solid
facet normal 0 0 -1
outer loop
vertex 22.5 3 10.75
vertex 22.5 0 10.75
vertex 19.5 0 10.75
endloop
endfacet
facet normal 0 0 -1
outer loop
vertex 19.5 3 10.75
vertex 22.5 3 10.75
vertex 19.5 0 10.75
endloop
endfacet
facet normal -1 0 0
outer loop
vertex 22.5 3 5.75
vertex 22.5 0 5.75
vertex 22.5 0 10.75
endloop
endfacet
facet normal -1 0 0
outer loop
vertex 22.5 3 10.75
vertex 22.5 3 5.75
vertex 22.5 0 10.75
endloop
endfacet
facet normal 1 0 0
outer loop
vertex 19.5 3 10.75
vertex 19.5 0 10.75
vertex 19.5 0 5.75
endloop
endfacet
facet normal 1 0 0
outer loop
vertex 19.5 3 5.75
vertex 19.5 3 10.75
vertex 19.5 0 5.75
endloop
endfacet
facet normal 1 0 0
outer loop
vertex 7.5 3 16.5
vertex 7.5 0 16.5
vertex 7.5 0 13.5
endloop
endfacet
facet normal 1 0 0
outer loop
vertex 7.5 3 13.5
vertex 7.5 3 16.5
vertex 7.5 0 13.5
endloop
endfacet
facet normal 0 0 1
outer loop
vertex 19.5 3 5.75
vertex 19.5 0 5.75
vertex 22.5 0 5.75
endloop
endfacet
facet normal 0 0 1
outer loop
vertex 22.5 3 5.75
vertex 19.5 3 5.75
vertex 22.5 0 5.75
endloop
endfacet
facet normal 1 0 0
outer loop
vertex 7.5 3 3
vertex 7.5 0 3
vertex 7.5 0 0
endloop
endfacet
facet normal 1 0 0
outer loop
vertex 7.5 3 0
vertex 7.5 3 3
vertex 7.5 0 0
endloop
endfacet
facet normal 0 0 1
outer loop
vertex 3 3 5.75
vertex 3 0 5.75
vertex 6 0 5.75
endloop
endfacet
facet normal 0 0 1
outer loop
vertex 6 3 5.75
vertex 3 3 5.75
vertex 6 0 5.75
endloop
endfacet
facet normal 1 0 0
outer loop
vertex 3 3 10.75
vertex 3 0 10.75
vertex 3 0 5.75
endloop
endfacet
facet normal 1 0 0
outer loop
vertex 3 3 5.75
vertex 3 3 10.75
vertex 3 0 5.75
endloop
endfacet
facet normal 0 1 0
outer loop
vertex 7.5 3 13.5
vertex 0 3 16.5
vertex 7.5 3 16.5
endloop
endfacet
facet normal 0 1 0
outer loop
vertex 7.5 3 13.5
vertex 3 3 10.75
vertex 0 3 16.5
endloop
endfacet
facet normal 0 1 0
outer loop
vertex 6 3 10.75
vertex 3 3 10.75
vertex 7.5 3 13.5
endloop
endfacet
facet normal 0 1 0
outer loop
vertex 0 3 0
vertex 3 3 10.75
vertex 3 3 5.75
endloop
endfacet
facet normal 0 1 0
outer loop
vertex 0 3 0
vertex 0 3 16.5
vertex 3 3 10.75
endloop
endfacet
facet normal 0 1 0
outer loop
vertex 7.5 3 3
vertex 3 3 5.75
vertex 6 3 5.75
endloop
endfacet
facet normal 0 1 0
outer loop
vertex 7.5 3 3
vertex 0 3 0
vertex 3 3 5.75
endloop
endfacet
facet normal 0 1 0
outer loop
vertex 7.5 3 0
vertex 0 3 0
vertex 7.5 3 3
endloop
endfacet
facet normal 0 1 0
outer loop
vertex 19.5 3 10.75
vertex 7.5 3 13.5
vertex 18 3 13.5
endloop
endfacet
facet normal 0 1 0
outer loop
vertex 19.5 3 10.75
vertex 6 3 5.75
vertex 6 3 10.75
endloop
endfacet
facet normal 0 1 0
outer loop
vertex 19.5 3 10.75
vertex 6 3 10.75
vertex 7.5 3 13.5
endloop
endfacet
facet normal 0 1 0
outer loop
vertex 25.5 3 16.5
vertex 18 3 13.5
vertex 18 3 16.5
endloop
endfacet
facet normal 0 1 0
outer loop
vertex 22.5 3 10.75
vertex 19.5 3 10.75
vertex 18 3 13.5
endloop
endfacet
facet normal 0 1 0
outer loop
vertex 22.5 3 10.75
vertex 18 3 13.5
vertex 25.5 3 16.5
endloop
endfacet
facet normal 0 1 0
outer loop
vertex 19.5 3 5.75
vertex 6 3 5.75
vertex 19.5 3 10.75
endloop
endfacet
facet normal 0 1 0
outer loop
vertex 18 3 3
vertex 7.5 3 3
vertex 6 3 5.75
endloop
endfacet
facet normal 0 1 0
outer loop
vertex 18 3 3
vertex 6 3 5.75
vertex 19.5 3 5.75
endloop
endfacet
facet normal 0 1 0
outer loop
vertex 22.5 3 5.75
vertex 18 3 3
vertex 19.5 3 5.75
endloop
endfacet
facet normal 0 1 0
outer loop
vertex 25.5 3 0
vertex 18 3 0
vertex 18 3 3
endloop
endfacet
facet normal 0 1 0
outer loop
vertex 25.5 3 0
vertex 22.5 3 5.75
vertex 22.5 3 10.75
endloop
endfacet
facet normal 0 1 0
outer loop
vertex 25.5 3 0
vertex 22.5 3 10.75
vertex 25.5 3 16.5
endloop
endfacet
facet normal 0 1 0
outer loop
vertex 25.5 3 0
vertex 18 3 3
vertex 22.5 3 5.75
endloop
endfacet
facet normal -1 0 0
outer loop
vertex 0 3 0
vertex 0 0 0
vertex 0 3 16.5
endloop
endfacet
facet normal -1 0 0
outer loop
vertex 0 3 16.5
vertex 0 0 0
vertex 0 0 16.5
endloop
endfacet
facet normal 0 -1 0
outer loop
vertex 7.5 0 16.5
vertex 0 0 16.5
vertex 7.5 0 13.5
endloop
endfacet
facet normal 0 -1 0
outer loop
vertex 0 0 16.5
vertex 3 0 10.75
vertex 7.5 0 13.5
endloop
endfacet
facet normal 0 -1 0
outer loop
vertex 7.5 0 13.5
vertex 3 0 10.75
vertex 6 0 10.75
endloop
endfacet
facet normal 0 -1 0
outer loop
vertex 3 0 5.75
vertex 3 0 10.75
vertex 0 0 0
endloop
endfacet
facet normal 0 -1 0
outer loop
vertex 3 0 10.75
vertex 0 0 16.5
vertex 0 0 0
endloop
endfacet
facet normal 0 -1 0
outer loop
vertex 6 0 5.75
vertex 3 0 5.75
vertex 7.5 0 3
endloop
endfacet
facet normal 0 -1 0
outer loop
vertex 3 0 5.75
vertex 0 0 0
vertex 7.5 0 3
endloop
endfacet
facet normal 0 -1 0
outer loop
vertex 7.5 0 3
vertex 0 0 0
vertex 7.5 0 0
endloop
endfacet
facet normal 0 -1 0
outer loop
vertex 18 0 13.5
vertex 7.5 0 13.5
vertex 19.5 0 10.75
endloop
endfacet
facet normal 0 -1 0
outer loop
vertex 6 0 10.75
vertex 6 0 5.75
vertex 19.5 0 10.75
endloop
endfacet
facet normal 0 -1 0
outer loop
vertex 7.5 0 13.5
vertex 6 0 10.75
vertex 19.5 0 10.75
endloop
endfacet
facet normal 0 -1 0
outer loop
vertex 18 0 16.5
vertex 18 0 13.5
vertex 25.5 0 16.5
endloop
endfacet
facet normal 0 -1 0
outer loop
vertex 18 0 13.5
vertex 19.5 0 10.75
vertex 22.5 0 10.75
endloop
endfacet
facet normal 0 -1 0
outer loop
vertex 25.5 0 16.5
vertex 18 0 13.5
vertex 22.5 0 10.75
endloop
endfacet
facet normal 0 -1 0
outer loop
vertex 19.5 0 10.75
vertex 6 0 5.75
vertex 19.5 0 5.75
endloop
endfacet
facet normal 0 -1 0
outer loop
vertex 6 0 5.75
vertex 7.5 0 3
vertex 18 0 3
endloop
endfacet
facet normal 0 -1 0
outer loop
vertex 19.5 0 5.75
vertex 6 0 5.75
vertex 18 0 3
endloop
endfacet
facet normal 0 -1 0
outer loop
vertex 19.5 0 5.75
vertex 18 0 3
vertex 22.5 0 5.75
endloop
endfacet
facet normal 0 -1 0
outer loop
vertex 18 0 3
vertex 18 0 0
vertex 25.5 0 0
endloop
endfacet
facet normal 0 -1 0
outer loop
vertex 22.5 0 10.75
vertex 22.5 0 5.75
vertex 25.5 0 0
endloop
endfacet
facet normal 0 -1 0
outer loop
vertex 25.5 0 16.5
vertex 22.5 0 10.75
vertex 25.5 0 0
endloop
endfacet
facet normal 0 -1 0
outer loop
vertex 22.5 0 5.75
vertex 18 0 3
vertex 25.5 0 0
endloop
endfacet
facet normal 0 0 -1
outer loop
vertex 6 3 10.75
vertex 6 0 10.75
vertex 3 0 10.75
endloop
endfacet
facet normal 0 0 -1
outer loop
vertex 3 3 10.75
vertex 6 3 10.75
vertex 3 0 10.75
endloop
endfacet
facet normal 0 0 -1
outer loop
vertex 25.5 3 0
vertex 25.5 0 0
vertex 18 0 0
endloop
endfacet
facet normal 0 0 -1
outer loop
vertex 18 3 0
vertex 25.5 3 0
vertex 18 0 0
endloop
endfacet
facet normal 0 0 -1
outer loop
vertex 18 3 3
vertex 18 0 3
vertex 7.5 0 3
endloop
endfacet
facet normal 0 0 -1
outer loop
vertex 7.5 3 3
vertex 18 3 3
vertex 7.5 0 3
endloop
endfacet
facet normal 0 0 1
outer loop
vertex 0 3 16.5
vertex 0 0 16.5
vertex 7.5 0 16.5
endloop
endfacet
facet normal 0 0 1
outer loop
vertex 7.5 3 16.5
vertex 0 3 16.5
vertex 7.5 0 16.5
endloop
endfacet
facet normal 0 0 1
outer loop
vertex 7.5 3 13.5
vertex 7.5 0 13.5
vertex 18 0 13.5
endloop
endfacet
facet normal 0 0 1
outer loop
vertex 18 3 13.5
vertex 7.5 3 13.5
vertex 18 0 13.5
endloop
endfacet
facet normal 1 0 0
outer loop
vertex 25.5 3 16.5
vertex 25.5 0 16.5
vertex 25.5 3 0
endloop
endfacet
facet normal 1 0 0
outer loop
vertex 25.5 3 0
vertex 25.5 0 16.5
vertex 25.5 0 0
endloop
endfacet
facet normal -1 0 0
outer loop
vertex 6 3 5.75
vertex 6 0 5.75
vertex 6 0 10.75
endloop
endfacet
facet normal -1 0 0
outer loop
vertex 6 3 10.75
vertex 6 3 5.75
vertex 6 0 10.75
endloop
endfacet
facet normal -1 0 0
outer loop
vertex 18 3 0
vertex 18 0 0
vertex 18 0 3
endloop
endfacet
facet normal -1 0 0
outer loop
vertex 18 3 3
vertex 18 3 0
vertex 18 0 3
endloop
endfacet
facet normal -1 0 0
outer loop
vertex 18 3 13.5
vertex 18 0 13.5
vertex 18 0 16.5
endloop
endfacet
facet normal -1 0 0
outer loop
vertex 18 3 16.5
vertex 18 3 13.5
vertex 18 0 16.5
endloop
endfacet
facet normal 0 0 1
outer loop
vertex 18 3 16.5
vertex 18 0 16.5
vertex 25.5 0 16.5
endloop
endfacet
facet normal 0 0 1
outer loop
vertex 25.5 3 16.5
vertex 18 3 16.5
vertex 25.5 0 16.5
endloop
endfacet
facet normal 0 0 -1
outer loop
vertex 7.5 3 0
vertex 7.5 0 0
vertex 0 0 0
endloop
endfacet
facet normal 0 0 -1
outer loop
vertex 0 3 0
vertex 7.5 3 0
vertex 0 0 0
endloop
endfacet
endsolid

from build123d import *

# Parameters (mm, degrees)
EXTRUDE_1_DEPTH = 3


with BuildPart() as part:
    # 草图1 → 凸台-拉伸1 (new body)
    with BuildSketch(Plane(origin=(0, 0, 0), x_dir=(1, 0, 0), z_dir=(0, 1, 0))):
        Polygon((3, -8.25), (0, -8.25), (0, -16.5), (7.5, -16.5), (7.5, -13.5), (12.75, -13.5), (12.75, -8.25), (6, -8.25), (6, -10.75), (3, -10.75), align=None)
        Polygon((0, 0), (0, -8.25), (3, -8.25), (3, -5.75), (6, -5.75), (6, -8.25), (12.75, -8.25), (12.75, -3), (7.5, -3), (7.5, 0), align=None)
        Polygon((12.75, -3), (12.75, -8.25), (19.5, -8.25), (19.5, -5.75), (22.5, -5.75), (22.5, -8.25), (25.5, -8.25), (25.5, 0), (18, 0), (18, -3), align=None)
        Polygon((19.5, -8.25), (12.75, -8.25), (12.75, -13.5), (18, -13.5), (18, -16.5), (25.5, -16.5), (25.5, -8.25), (22.5, -8.25), (22.5, -10.75), (19.5, -10.75), align=None)
    extrude(amount=EXTRUDE_1_DEPTH)


solid = part.part
